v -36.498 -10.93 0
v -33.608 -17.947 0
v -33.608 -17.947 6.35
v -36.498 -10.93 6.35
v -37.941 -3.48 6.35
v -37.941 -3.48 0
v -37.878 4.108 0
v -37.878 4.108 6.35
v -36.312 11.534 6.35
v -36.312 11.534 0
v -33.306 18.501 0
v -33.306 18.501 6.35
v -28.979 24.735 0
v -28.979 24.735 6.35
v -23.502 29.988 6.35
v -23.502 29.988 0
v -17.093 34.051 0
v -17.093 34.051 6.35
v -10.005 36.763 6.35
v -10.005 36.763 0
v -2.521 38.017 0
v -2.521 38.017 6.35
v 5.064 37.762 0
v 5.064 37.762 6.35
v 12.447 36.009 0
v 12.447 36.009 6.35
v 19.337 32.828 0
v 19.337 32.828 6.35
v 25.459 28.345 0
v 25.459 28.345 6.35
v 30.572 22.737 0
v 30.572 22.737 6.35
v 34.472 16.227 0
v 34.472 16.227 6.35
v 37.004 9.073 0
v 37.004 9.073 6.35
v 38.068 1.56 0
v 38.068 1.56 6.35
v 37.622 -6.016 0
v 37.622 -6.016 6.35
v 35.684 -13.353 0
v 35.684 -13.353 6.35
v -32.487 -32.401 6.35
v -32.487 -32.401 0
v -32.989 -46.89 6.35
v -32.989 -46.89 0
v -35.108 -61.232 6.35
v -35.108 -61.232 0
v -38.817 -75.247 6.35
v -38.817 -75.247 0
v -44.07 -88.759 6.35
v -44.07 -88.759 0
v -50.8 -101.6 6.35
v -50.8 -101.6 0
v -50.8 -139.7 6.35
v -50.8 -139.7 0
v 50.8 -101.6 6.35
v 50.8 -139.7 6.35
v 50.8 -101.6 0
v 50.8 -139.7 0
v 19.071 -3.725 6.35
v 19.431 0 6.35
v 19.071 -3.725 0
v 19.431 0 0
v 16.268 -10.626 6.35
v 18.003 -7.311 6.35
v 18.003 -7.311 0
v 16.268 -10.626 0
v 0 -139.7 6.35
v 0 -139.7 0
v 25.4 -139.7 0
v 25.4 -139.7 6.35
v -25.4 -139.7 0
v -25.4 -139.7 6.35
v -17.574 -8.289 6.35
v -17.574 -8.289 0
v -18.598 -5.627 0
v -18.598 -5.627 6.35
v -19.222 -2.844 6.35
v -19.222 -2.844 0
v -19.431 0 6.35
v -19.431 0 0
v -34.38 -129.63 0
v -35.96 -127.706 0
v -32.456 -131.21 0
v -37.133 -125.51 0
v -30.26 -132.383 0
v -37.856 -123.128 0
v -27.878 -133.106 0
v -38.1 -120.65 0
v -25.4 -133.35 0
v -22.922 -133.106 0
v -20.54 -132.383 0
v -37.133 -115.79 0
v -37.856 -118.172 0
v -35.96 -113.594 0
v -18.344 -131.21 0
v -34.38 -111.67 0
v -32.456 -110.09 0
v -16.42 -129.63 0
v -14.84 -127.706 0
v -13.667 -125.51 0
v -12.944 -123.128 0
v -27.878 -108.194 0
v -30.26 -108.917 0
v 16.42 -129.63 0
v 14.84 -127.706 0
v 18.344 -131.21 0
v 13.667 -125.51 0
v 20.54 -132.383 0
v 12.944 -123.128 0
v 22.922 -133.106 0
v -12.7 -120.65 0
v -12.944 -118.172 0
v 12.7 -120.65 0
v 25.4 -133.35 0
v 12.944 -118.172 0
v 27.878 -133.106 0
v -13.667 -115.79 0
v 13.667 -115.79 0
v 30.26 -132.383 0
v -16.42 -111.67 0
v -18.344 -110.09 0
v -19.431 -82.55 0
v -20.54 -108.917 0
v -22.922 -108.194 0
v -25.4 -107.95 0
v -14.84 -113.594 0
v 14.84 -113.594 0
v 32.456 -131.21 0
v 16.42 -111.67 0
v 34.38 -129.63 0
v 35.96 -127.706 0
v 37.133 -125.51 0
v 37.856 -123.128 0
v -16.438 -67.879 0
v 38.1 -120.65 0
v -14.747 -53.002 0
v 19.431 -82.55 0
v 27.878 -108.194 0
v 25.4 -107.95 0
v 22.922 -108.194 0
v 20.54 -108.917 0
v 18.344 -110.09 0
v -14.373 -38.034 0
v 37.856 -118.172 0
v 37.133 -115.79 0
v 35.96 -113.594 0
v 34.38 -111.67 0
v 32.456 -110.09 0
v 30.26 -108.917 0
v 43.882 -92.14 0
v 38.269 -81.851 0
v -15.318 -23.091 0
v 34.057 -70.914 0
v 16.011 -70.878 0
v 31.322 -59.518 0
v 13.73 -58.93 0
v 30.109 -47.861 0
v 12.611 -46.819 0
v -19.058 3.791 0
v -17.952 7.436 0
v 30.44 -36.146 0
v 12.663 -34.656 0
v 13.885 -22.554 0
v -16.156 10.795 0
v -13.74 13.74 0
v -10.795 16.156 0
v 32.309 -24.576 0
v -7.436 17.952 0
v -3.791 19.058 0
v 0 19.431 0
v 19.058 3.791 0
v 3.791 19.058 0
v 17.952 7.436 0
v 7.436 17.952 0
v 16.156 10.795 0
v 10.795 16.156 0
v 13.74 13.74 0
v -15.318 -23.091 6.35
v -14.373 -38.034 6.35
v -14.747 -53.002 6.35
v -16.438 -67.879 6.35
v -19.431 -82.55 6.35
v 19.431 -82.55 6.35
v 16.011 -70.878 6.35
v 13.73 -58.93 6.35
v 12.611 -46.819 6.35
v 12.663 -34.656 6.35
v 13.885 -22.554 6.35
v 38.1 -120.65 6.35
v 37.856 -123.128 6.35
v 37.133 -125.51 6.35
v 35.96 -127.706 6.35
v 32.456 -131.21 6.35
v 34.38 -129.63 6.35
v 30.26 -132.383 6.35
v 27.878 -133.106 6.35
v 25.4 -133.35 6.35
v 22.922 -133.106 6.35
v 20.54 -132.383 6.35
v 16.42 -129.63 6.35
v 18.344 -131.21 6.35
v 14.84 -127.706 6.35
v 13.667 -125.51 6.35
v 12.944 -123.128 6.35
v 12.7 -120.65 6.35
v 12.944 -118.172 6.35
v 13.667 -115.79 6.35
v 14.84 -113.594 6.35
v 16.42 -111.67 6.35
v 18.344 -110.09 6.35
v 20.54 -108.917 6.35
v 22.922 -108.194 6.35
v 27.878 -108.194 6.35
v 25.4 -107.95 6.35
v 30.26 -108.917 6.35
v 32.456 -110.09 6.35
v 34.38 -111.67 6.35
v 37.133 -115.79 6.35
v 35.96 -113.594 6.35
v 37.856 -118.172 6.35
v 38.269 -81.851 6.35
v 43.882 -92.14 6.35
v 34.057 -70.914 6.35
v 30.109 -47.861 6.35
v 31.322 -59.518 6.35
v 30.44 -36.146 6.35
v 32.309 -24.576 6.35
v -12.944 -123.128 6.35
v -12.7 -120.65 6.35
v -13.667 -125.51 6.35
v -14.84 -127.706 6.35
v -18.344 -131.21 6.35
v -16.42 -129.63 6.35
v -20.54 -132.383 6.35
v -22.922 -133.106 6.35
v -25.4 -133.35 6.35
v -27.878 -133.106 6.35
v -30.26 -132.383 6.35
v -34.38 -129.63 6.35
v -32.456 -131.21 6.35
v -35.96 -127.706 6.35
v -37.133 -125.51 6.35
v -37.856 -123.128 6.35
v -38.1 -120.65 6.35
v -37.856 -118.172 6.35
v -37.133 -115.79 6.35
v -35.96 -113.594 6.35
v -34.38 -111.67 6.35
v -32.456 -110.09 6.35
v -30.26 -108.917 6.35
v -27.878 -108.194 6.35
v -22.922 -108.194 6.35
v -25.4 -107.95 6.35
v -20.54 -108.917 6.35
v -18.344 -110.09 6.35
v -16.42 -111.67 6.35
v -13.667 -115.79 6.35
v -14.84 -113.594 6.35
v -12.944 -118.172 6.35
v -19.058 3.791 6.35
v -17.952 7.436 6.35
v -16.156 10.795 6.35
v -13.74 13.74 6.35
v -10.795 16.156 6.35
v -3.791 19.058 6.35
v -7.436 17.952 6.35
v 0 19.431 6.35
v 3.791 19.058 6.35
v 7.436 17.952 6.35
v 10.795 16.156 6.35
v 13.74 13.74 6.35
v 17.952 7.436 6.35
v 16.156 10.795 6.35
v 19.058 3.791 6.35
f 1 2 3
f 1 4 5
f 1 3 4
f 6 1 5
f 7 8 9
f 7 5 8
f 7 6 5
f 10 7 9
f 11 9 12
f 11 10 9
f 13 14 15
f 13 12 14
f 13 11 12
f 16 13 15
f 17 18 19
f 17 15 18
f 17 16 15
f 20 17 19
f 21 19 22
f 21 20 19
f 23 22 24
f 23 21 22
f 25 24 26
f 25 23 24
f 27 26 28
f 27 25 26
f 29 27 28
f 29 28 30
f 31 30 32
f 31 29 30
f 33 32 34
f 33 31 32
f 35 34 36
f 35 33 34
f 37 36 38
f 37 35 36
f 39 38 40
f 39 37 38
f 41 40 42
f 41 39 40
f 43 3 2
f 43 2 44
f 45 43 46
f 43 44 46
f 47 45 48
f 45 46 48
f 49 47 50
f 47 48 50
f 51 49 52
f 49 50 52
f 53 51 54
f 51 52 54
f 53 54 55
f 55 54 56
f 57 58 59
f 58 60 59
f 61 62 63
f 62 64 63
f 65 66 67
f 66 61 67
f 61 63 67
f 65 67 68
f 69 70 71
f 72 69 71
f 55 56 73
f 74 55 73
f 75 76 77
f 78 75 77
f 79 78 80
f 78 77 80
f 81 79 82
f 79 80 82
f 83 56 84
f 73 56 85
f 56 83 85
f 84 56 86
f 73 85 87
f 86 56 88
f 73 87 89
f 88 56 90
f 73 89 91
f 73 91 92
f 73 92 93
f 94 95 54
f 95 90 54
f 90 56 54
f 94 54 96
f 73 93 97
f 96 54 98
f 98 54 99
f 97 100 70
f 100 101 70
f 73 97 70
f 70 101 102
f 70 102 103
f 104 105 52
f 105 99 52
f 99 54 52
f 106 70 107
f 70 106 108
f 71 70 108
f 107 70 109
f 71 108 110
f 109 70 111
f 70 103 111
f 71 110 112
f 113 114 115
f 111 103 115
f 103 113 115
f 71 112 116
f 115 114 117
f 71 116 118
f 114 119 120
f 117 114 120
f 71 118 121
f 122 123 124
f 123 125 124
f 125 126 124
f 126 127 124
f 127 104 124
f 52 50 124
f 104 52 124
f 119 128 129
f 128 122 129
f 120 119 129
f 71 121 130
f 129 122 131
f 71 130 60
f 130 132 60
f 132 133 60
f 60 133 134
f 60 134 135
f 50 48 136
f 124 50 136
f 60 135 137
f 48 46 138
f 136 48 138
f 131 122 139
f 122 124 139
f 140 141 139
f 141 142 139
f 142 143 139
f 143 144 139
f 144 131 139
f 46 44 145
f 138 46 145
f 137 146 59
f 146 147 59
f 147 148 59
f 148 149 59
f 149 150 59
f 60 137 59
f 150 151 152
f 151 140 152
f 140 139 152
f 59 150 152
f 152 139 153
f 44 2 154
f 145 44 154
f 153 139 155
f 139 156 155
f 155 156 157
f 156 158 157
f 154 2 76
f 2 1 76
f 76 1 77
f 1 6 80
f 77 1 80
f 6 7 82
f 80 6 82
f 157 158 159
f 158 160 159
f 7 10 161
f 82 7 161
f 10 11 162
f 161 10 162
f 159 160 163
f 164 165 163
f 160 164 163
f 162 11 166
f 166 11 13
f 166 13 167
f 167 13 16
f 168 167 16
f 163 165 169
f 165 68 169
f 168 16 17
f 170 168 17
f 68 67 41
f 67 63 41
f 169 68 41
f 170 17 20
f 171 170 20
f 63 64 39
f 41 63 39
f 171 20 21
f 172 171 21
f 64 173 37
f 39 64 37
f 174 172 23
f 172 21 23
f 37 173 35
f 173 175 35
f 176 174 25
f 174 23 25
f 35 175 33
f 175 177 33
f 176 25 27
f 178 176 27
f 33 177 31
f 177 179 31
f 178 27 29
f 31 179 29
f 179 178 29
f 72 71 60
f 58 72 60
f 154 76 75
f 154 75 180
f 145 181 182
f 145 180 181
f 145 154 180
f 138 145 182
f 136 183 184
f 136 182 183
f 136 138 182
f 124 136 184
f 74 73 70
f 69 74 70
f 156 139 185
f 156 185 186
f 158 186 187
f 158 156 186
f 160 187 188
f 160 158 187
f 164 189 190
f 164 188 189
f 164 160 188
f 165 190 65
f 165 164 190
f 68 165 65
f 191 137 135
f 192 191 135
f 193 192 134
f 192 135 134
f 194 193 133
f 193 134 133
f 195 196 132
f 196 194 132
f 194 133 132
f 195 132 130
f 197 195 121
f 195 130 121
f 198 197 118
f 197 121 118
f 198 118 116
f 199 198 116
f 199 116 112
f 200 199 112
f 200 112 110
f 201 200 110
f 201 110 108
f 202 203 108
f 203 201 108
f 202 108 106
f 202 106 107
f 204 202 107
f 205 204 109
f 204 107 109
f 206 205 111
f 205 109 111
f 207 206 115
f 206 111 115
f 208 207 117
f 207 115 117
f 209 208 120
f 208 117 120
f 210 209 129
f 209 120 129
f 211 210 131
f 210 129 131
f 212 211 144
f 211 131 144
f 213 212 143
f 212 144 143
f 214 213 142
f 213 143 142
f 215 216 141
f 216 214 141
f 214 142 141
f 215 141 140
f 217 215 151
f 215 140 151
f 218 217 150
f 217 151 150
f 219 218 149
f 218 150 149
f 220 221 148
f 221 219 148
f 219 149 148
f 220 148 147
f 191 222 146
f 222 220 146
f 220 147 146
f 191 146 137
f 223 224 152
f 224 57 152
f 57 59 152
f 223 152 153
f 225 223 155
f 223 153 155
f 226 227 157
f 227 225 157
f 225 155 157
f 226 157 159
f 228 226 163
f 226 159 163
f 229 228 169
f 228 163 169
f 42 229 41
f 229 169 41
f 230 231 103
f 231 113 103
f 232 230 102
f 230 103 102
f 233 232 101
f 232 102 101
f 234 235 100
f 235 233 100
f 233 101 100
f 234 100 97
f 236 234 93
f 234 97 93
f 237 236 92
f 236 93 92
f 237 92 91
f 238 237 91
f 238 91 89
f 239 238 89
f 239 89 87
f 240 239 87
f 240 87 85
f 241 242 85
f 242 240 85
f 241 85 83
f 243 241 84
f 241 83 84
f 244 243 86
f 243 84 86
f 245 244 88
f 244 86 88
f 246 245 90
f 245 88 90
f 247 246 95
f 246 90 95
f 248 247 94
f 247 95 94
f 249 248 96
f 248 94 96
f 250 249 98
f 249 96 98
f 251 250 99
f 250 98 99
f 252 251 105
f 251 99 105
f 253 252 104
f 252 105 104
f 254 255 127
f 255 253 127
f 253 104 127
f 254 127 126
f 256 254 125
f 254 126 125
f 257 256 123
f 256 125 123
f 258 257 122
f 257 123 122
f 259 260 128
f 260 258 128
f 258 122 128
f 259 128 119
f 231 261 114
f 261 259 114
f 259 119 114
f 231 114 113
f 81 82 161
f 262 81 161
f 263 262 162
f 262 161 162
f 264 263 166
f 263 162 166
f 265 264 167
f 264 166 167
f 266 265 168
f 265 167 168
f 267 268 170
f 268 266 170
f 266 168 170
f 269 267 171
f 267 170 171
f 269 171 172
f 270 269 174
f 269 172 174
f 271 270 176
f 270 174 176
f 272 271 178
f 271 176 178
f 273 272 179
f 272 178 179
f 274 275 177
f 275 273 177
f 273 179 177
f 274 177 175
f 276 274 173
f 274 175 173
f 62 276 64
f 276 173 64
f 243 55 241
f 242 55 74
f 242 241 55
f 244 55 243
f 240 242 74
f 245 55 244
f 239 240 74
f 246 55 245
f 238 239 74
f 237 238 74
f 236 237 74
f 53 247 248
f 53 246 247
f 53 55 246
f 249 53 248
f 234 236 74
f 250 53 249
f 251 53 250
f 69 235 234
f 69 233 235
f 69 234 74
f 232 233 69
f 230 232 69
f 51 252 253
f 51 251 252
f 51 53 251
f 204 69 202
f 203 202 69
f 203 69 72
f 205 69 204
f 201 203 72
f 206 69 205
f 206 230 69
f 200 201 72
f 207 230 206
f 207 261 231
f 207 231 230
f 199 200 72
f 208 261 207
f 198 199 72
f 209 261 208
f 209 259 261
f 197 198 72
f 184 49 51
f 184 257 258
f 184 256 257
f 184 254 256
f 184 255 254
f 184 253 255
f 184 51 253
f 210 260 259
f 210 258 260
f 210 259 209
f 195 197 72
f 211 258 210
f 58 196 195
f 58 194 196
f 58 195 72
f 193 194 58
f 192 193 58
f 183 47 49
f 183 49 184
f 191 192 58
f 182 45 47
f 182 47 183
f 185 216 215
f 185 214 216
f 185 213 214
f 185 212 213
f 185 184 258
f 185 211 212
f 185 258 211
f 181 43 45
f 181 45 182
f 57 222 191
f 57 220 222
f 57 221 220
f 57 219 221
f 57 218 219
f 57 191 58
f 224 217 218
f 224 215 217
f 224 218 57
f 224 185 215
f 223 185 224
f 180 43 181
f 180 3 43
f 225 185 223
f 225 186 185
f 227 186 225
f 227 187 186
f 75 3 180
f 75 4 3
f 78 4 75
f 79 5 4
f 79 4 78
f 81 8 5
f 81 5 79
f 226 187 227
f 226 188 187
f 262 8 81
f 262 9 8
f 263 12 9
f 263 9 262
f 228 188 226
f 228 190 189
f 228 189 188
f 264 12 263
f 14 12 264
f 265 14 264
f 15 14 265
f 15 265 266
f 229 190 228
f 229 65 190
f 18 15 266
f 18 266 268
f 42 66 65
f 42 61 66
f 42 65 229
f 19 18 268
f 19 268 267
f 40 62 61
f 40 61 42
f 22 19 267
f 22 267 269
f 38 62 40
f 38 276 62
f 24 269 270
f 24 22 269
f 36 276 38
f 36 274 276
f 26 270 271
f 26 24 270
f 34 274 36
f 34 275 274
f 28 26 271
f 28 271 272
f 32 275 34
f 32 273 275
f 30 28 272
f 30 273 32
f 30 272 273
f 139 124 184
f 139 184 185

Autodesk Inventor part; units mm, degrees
ref_plane "YZ Plane" through (0, 0, 0) normal (1, 0, 0) x (0, 1, 0)
ref_plane "XZ Plane" through (0, 0, 0) normal (0, 1, 0) x (-1, 0, 0)
ref_plane "XY Plane" through (0, 0, 0) normal (0, 0, 1) x (1, 0, 0)
sketch "Sketch1" plane through (0, 0, 0) normal (0, 0, 1) x (1, 0, 0)
  arc A0 (35.3023, -14.3304) -> (-33.6082, -17.9471) centre (0, 0) ccw
  circle A1 centre (0, 0) radius 19.431
  arc A2 (19.431, 0) -> (19.431, -82.55) centre (138.6611, -41.275) ccw
  arc A3 (-19.431, -82.55) -> (-19.431, 0) centre (-184.2713, -41.275) ccw
  line L0 (-19.431, -82.55) -> (19.431, -82.55)
  arc A4 (35.6836, -13.3526) -> (57.2802, -108.5447) centre (118.9453, -44.5086) ccw
  line L1 (0, -139.7) -> (50.8, -139.7)
  line L2 (50.8, -139.7) -> (50.8, -101.6)
  line L3 (-50.8, -101.6) -> (-50.8, -139.7)
  line L4 (-50.8, -139.7) -> (0, -139.7)
  arc A5 (-50.8, -101.6) -> (-33.6082, -17.9471) centre (-161.9278, -35.1687) ccw
  line L5 (-50.8, -139.7) -> (-25.4, -139.7)
  circle A6 centre (-25.4, -120.65) radius 12.7
  line L6 (50.8, -139.7) -> (25.4, -139.7)
  circle A7 centre (25.4, -120.65) radius 12.7
  dimension "d0" = 76.2
  dimension "d1" = 38.862
  dimension "d5" = 177.8
  dimension "d12" = 101.6
  dimension "d13" = 38.1
  dimension "d14" = 139.7
  dimension "d20" = 25.4
  dimension "d21" = 25.4
  dimension "d23" = 25.4
extrude "Extrusion1" add sketch "Sketch1" along normal blind 6.35
properties part number "4-4"
